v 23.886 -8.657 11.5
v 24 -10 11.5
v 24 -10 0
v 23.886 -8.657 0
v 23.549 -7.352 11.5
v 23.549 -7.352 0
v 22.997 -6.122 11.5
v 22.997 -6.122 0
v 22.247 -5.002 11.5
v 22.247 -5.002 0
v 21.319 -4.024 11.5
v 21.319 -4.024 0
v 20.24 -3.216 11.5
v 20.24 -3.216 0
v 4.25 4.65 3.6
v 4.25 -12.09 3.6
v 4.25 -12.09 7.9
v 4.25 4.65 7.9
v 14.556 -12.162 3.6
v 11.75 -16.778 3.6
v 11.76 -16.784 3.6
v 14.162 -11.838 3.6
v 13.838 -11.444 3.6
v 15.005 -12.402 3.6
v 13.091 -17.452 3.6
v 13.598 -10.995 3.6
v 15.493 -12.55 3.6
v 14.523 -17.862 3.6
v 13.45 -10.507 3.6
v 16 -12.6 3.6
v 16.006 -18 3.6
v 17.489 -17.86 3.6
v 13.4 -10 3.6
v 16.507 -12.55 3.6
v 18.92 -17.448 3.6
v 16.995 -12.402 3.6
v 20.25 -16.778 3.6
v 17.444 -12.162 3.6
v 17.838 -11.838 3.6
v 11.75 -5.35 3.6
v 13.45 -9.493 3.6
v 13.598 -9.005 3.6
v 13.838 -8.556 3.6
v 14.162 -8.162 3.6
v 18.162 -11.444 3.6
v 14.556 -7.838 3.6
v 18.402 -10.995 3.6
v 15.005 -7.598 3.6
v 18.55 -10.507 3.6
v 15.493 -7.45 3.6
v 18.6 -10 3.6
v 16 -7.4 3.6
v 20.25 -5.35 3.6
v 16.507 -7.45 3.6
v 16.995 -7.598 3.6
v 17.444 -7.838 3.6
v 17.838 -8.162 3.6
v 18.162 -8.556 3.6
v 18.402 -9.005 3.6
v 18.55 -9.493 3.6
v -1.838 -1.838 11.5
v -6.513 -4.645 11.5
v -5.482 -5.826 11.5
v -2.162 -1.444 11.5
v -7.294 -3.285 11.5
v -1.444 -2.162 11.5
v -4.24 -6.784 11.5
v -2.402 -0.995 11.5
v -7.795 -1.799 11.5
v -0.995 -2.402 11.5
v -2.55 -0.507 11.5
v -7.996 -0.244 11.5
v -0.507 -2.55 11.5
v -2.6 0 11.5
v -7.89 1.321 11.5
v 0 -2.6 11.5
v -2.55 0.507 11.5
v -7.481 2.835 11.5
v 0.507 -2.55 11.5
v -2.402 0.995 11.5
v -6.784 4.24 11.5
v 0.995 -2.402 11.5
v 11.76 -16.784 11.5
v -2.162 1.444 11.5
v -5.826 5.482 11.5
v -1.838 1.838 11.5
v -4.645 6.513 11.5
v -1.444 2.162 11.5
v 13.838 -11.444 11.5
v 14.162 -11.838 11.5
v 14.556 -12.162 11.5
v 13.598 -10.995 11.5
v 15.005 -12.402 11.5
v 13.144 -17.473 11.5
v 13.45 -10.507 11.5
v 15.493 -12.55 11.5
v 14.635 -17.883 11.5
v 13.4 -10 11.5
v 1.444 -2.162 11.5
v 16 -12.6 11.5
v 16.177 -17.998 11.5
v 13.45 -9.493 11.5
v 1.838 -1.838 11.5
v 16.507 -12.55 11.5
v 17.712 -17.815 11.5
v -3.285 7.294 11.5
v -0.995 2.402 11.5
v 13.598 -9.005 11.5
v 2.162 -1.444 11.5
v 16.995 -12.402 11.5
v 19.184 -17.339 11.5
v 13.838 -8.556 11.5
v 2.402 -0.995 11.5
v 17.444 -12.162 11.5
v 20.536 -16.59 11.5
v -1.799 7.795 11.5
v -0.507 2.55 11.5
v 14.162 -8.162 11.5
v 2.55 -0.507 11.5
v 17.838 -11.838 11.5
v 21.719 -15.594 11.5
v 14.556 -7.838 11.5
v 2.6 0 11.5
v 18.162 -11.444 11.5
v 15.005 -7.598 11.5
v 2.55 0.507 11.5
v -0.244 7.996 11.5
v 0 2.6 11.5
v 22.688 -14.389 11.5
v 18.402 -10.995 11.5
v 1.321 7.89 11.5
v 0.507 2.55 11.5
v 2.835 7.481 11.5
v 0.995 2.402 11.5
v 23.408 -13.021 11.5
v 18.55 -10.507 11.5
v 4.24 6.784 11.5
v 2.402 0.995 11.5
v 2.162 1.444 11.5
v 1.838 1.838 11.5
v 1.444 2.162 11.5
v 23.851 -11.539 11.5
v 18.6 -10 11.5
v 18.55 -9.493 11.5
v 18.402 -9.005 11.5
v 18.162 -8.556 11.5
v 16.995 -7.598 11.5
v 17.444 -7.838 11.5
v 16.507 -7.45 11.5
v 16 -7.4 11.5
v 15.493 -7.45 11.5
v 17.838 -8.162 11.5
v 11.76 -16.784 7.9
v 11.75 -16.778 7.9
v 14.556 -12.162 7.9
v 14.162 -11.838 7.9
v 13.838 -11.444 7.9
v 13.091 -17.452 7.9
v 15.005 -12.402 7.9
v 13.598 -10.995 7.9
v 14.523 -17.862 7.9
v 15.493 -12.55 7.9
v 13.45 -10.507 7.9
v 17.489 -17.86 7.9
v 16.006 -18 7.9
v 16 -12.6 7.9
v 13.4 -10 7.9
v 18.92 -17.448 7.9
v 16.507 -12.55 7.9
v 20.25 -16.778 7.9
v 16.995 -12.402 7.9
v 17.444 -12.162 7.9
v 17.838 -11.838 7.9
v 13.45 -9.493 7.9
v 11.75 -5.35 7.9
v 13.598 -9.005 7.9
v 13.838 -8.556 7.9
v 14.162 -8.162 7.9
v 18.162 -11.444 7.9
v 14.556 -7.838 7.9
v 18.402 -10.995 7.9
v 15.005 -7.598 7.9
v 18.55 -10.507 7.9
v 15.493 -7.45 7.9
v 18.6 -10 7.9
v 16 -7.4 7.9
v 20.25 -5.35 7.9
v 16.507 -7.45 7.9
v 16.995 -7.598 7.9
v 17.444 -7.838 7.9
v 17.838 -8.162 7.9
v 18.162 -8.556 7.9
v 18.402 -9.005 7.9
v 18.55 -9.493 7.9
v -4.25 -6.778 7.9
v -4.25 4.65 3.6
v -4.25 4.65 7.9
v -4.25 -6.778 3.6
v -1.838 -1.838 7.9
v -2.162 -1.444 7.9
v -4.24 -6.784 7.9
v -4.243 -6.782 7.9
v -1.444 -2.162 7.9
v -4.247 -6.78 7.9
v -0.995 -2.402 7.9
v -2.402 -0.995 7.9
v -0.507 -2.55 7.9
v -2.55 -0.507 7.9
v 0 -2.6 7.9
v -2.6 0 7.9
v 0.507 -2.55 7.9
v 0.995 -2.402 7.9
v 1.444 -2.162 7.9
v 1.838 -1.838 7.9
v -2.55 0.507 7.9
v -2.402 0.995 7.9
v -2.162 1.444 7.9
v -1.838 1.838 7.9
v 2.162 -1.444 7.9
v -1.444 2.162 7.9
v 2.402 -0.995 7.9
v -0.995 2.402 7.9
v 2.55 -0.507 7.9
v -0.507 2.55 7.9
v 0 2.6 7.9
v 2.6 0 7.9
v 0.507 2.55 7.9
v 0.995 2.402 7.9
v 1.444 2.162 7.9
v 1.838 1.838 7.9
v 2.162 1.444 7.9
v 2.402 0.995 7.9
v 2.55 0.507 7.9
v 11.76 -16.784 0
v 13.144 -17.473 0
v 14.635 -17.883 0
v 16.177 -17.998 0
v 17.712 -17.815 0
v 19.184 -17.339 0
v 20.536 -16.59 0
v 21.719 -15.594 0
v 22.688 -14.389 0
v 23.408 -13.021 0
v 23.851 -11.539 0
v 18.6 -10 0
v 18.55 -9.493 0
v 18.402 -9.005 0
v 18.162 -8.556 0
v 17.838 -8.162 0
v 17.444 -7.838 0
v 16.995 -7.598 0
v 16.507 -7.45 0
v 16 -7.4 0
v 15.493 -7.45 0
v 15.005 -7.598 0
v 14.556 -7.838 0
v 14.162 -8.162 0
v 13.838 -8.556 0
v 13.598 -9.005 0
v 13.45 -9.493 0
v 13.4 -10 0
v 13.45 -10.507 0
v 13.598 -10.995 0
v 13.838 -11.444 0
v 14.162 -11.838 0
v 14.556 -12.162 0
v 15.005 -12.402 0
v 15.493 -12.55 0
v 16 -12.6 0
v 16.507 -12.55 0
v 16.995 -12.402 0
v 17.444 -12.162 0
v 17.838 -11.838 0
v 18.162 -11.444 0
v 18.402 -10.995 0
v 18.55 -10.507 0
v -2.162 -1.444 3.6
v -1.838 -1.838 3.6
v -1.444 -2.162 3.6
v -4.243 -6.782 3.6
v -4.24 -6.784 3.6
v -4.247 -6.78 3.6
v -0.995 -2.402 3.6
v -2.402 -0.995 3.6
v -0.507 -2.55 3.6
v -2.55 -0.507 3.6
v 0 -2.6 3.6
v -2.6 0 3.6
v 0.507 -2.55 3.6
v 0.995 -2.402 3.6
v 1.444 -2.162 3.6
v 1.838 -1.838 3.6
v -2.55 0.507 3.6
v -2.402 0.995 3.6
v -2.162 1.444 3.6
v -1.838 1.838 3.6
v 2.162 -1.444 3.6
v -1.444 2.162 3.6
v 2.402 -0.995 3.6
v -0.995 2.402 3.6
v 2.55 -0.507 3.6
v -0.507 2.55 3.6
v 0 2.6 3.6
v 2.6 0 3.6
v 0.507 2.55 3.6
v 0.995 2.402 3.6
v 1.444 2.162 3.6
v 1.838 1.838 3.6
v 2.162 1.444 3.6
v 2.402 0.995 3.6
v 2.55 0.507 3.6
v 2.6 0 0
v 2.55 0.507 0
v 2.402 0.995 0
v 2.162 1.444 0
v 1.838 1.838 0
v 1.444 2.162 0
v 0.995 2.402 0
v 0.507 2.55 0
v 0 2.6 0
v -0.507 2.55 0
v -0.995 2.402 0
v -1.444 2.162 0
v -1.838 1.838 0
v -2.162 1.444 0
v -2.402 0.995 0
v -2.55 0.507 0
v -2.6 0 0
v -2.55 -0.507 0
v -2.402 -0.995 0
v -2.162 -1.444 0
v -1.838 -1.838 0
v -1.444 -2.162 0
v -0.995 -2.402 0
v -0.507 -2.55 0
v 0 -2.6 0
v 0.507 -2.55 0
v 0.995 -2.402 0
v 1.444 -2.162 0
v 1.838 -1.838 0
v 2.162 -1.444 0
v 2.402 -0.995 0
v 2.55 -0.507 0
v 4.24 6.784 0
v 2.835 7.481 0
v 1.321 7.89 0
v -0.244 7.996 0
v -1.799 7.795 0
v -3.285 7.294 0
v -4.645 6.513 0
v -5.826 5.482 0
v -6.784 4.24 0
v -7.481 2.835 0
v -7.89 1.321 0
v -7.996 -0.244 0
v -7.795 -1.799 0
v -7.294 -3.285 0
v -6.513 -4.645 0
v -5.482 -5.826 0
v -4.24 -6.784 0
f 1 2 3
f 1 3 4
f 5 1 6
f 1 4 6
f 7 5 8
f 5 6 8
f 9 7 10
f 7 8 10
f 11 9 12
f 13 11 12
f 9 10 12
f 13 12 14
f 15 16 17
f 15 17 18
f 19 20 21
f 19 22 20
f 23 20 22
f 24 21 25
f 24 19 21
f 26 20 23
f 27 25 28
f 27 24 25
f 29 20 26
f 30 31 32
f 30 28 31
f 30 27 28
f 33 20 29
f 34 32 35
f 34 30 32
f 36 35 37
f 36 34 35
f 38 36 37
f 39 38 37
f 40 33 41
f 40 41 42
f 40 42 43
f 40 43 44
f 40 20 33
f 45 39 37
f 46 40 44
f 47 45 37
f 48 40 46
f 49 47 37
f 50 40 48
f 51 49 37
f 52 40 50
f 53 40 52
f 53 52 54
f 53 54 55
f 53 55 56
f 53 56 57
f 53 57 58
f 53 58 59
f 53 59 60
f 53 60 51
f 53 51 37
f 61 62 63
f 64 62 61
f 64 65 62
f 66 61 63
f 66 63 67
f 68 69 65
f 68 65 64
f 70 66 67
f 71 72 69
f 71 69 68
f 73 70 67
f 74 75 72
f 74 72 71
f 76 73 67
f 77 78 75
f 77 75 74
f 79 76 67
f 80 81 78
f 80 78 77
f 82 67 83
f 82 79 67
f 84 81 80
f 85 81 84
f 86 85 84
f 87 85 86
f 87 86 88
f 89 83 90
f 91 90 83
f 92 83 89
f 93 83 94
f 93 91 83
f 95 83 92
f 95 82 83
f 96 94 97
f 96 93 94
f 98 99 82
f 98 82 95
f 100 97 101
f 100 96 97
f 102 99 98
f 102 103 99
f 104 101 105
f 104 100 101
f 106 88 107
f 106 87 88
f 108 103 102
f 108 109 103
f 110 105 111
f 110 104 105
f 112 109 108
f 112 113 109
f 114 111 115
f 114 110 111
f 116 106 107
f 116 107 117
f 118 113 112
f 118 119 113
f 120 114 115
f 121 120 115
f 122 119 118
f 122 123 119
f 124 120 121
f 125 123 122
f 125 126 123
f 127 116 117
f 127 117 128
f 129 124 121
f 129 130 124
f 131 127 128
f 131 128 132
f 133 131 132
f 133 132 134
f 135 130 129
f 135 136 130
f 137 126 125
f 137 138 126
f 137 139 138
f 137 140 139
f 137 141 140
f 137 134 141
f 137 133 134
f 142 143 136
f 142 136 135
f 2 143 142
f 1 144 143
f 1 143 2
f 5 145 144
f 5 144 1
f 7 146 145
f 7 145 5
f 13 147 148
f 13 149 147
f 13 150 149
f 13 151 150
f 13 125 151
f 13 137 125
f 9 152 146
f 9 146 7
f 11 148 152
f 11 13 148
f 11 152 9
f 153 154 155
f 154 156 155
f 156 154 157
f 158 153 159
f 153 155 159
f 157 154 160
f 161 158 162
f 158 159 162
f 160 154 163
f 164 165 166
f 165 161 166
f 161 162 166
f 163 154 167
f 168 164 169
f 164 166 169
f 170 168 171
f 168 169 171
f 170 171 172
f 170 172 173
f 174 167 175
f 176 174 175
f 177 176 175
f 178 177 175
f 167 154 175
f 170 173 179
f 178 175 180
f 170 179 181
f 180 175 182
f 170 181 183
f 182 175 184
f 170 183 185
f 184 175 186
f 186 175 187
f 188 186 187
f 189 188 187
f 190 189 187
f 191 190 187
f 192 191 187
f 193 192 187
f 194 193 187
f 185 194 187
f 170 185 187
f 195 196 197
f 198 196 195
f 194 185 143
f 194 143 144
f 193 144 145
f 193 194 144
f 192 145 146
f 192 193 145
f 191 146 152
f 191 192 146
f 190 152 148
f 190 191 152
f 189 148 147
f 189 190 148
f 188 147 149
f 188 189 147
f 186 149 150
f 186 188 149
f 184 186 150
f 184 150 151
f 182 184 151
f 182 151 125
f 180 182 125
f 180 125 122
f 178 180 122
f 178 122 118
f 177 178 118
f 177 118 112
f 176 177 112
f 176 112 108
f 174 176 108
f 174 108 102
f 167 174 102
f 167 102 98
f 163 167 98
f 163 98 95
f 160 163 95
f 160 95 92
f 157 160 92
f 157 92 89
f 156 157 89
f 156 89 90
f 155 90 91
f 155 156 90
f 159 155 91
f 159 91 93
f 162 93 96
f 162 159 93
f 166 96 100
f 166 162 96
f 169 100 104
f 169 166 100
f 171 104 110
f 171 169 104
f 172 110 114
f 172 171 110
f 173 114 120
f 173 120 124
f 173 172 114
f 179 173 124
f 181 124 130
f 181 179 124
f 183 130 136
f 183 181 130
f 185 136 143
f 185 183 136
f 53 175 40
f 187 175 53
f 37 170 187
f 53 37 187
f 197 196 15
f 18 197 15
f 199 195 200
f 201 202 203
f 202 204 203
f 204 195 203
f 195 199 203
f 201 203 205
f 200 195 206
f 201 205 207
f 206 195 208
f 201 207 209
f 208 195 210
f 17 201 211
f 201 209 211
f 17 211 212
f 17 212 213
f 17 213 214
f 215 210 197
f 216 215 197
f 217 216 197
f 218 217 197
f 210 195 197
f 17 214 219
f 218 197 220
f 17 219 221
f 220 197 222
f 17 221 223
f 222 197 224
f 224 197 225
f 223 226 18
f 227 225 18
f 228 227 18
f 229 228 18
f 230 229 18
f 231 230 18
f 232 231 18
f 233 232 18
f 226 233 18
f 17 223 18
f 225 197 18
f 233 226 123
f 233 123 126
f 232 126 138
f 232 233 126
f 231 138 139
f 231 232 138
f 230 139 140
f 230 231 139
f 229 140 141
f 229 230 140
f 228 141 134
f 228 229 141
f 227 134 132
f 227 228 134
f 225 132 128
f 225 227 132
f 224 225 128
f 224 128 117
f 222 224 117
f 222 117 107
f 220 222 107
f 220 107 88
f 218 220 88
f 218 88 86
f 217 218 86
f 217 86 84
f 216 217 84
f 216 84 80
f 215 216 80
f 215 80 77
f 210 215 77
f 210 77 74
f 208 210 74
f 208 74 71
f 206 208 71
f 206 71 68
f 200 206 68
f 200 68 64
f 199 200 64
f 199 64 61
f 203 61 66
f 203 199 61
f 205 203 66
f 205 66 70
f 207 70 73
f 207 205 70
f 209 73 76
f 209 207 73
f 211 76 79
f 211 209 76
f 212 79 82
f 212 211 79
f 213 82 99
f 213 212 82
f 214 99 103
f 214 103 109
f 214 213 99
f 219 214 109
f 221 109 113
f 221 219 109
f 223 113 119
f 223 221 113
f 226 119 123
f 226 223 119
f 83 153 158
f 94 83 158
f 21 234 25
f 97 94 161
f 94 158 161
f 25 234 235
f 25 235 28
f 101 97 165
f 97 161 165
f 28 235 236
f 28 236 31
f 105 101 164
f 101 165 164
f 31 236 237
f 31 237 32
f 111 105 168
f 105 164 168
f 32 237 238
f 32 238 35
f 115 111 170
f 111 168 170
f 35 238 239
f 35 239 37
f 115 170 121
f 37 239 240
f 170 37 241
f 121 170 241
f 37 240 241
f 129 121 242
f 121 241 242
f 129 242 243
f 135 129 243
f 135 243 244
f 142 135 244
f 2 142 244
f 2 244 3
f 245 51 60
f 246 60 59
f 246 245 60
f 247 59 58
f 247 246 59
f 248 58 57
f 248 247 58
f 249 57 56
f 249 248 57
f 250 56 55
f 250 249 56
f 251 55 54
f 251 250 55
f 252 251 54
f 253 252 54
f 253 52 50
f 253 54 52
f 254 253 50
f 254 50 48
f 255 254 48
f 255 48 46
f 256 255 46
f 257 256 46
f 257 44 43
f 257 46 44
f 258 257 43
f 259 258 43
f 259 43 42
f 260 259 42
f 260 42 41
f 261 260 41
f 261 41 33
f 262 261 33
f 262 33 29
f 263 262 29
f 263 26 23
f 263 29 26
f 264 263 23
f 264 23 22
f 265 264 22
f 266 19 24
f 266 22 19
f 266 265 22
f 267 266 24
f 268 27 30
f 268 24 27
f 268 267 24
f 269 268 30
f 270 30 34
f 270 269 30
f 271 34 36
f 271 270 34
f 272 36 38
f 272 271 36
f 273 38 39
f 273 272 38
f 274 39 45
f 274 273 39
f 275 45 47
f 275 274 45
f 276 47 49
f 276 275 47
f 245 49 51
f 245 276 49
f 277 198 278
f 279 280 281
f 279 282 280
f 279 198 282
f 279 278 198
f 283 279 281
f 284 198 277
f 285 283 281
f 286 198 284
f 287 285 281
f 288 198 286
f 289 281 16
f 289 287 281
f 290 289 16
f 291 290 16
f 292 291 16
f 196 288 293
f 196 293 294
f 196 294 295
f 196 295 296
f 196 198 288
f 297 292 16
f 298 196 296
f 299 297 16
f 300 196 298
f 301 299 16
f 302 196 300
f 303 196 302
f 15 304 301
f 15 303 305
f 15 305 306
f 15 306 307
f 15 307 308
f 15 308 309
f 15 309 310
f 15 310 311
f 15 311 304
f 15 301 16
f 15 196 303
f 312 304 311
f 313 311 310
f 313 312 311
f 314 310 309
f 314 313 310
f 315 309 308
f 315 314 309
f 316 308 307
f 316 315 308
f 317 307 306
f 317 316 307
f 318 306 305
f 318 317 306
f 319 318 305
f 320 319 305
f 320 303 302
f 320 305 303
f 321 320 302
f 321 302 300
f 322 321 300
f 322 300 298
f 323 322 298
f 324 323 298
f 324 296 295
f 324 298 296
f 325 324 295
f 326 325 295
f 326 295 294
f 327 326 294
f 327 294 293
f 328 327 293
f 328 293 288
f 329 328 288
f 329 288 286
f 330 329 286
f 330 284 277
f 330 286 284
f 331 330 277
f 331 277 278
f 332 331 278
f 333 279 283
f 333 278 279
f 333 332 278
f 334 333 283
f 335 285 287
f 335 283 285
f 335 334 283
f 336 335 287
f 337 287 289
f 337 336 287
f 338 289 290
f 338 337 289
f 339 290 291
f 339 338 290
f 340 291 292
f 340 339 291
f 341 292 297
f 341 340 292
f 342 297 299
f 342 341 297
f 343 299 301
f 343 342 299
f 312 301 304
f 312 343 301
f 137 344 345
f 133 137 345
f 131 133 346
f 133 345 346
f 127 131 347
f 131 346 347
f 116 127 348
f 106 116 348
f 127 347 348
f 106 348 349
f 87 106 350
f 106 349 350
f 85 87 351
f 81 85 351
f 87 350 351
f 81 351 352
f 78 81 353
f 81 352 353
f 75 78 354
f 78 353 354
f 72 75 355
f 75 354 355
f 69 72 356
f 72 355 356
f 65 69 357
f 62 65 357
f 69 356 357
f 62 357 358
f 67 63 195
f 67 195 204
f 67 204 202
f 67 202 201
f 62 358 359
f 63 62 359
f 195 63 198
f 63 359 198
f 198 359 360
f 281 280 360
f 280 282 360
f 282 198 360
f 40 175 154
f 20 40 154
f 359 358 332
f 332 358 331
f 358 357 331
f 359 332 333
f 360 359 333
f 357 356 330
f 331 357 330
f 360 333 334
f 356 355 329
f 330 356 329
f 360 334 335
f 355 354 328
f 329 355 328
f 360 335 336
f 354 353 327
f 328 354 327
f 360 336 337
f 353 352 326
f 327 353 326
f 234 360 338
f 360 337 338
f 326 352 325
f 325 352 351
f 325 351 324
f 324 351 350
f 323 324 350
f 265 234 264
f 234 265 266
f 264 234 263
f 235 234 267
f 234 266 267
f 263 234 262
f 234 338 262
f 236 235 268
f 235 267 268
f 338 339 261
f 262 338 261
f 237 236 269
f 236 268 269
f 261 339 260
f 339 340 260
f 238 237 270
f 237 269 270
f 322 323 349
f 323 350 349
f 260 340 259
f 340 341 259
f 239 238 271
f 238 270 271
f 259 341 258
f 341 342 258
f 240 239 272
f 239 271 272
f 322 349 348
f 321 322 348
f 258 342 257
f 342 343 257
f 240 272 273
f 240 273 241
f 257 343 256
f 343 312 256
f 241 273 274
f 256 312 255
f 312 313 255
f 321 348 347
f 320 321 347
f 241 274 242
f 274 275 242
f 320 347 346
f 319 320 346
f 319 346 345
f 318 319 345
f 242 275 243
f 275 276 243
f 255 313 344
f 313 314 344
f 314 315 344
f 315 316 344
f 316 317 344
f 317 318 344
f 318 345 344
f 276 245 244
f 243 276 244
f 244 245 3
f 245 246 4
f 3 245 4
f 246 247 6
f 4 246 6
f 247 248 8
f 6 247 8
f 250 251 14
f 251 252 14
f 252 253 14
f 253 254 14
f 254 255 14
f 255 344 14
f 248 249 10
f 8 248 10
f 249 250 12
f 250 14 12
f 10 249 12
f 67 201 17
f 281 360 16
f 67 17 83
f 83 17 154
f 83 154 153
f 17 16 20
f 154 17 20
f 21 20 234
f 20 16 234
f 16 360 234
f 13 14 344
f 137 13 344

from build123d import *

# Parameters (mm, degrees)
F0_R     = 2.6
F1_DEPTH = 11.5
F3_W     = 8.5
F3_H     = 10
F3_H_2   = 9.3
F4_DEPTH = 2.15


with BuildPart() as f1:
    # F0 (on Top) → F1 (new body)
    with BuildSketch(Plane.XY):
        with BuildLine():
            ThreePointArc((-4.23999152, -6.783986432), (3.8781482591, -6.99713985), (8, 0))
            ThreePointArc((8, 0), (6.99713985, 3.8781482591), (4.23999152, 6.783986432))
            ThreePointArc((4.23999152, 6.783986432), (-6.783986432, 4.23999152), (-4.23999152, -6.783986432))
        make_face()
        Circle(F0_R, mode=Mode.SUBTRACT)
        with BuildLine():
            ThreePointArc((4.23999152, 6.783986432), (6.99713985, 3.8781482591), (8, 0))
            ThreePointArc((8, 0), (3.8781482591, -6.99713985), (-4.23999152, -6.783986432))
            Line((-4.23999152, -6.783986432), (11.76000848, -16.783986432))
            ThreePointArc((11.76000848, -16.783986432), (9.216013568, -5.76000848), (20.23999152, -3.216013568))
            Line((20.23999152, -3.216013568), (4.23999152, 6.783986432))
        make_face()
        with BuildLine():
            ThreePointArc((24, -10), (22.99713985, -6.1218517409), (20.23999152, -3.216013568))
            ThreePointArc((20.23999152, -3.216013568), (9.216013568, -5.76000848), (11.76000848, -16.783986432))
            ThreePointArc((11.76000848, -16.783986432), (19.8781482591, -16.99713985), (24, -10))
        make_face()
        with Locations((16, -10)):
            Circle(F0_R, mode=Mode.SUBTRACT)
    extrude(amount=F1_DEPTH)

    # F3 (on mid) → F4 (cut, symmetric)
    with BuildSketch(Plane.XY.offset(5.75)):
        with Locations((0, -9.65)):
            Rectangle(F3_W, F3_H)
        Rectangle(F3_W, F3_H_2)
        with Locations((16, -19.65)):
            Rectangle(F3_W, F3_H)
        with Locations((16, -10)):
            Rectangle(F3_W, F3_H_2)
    extrude(amount=F4_DEPTH, both=True, mode=Mode.SUBTRACT)


solid = f1.part
